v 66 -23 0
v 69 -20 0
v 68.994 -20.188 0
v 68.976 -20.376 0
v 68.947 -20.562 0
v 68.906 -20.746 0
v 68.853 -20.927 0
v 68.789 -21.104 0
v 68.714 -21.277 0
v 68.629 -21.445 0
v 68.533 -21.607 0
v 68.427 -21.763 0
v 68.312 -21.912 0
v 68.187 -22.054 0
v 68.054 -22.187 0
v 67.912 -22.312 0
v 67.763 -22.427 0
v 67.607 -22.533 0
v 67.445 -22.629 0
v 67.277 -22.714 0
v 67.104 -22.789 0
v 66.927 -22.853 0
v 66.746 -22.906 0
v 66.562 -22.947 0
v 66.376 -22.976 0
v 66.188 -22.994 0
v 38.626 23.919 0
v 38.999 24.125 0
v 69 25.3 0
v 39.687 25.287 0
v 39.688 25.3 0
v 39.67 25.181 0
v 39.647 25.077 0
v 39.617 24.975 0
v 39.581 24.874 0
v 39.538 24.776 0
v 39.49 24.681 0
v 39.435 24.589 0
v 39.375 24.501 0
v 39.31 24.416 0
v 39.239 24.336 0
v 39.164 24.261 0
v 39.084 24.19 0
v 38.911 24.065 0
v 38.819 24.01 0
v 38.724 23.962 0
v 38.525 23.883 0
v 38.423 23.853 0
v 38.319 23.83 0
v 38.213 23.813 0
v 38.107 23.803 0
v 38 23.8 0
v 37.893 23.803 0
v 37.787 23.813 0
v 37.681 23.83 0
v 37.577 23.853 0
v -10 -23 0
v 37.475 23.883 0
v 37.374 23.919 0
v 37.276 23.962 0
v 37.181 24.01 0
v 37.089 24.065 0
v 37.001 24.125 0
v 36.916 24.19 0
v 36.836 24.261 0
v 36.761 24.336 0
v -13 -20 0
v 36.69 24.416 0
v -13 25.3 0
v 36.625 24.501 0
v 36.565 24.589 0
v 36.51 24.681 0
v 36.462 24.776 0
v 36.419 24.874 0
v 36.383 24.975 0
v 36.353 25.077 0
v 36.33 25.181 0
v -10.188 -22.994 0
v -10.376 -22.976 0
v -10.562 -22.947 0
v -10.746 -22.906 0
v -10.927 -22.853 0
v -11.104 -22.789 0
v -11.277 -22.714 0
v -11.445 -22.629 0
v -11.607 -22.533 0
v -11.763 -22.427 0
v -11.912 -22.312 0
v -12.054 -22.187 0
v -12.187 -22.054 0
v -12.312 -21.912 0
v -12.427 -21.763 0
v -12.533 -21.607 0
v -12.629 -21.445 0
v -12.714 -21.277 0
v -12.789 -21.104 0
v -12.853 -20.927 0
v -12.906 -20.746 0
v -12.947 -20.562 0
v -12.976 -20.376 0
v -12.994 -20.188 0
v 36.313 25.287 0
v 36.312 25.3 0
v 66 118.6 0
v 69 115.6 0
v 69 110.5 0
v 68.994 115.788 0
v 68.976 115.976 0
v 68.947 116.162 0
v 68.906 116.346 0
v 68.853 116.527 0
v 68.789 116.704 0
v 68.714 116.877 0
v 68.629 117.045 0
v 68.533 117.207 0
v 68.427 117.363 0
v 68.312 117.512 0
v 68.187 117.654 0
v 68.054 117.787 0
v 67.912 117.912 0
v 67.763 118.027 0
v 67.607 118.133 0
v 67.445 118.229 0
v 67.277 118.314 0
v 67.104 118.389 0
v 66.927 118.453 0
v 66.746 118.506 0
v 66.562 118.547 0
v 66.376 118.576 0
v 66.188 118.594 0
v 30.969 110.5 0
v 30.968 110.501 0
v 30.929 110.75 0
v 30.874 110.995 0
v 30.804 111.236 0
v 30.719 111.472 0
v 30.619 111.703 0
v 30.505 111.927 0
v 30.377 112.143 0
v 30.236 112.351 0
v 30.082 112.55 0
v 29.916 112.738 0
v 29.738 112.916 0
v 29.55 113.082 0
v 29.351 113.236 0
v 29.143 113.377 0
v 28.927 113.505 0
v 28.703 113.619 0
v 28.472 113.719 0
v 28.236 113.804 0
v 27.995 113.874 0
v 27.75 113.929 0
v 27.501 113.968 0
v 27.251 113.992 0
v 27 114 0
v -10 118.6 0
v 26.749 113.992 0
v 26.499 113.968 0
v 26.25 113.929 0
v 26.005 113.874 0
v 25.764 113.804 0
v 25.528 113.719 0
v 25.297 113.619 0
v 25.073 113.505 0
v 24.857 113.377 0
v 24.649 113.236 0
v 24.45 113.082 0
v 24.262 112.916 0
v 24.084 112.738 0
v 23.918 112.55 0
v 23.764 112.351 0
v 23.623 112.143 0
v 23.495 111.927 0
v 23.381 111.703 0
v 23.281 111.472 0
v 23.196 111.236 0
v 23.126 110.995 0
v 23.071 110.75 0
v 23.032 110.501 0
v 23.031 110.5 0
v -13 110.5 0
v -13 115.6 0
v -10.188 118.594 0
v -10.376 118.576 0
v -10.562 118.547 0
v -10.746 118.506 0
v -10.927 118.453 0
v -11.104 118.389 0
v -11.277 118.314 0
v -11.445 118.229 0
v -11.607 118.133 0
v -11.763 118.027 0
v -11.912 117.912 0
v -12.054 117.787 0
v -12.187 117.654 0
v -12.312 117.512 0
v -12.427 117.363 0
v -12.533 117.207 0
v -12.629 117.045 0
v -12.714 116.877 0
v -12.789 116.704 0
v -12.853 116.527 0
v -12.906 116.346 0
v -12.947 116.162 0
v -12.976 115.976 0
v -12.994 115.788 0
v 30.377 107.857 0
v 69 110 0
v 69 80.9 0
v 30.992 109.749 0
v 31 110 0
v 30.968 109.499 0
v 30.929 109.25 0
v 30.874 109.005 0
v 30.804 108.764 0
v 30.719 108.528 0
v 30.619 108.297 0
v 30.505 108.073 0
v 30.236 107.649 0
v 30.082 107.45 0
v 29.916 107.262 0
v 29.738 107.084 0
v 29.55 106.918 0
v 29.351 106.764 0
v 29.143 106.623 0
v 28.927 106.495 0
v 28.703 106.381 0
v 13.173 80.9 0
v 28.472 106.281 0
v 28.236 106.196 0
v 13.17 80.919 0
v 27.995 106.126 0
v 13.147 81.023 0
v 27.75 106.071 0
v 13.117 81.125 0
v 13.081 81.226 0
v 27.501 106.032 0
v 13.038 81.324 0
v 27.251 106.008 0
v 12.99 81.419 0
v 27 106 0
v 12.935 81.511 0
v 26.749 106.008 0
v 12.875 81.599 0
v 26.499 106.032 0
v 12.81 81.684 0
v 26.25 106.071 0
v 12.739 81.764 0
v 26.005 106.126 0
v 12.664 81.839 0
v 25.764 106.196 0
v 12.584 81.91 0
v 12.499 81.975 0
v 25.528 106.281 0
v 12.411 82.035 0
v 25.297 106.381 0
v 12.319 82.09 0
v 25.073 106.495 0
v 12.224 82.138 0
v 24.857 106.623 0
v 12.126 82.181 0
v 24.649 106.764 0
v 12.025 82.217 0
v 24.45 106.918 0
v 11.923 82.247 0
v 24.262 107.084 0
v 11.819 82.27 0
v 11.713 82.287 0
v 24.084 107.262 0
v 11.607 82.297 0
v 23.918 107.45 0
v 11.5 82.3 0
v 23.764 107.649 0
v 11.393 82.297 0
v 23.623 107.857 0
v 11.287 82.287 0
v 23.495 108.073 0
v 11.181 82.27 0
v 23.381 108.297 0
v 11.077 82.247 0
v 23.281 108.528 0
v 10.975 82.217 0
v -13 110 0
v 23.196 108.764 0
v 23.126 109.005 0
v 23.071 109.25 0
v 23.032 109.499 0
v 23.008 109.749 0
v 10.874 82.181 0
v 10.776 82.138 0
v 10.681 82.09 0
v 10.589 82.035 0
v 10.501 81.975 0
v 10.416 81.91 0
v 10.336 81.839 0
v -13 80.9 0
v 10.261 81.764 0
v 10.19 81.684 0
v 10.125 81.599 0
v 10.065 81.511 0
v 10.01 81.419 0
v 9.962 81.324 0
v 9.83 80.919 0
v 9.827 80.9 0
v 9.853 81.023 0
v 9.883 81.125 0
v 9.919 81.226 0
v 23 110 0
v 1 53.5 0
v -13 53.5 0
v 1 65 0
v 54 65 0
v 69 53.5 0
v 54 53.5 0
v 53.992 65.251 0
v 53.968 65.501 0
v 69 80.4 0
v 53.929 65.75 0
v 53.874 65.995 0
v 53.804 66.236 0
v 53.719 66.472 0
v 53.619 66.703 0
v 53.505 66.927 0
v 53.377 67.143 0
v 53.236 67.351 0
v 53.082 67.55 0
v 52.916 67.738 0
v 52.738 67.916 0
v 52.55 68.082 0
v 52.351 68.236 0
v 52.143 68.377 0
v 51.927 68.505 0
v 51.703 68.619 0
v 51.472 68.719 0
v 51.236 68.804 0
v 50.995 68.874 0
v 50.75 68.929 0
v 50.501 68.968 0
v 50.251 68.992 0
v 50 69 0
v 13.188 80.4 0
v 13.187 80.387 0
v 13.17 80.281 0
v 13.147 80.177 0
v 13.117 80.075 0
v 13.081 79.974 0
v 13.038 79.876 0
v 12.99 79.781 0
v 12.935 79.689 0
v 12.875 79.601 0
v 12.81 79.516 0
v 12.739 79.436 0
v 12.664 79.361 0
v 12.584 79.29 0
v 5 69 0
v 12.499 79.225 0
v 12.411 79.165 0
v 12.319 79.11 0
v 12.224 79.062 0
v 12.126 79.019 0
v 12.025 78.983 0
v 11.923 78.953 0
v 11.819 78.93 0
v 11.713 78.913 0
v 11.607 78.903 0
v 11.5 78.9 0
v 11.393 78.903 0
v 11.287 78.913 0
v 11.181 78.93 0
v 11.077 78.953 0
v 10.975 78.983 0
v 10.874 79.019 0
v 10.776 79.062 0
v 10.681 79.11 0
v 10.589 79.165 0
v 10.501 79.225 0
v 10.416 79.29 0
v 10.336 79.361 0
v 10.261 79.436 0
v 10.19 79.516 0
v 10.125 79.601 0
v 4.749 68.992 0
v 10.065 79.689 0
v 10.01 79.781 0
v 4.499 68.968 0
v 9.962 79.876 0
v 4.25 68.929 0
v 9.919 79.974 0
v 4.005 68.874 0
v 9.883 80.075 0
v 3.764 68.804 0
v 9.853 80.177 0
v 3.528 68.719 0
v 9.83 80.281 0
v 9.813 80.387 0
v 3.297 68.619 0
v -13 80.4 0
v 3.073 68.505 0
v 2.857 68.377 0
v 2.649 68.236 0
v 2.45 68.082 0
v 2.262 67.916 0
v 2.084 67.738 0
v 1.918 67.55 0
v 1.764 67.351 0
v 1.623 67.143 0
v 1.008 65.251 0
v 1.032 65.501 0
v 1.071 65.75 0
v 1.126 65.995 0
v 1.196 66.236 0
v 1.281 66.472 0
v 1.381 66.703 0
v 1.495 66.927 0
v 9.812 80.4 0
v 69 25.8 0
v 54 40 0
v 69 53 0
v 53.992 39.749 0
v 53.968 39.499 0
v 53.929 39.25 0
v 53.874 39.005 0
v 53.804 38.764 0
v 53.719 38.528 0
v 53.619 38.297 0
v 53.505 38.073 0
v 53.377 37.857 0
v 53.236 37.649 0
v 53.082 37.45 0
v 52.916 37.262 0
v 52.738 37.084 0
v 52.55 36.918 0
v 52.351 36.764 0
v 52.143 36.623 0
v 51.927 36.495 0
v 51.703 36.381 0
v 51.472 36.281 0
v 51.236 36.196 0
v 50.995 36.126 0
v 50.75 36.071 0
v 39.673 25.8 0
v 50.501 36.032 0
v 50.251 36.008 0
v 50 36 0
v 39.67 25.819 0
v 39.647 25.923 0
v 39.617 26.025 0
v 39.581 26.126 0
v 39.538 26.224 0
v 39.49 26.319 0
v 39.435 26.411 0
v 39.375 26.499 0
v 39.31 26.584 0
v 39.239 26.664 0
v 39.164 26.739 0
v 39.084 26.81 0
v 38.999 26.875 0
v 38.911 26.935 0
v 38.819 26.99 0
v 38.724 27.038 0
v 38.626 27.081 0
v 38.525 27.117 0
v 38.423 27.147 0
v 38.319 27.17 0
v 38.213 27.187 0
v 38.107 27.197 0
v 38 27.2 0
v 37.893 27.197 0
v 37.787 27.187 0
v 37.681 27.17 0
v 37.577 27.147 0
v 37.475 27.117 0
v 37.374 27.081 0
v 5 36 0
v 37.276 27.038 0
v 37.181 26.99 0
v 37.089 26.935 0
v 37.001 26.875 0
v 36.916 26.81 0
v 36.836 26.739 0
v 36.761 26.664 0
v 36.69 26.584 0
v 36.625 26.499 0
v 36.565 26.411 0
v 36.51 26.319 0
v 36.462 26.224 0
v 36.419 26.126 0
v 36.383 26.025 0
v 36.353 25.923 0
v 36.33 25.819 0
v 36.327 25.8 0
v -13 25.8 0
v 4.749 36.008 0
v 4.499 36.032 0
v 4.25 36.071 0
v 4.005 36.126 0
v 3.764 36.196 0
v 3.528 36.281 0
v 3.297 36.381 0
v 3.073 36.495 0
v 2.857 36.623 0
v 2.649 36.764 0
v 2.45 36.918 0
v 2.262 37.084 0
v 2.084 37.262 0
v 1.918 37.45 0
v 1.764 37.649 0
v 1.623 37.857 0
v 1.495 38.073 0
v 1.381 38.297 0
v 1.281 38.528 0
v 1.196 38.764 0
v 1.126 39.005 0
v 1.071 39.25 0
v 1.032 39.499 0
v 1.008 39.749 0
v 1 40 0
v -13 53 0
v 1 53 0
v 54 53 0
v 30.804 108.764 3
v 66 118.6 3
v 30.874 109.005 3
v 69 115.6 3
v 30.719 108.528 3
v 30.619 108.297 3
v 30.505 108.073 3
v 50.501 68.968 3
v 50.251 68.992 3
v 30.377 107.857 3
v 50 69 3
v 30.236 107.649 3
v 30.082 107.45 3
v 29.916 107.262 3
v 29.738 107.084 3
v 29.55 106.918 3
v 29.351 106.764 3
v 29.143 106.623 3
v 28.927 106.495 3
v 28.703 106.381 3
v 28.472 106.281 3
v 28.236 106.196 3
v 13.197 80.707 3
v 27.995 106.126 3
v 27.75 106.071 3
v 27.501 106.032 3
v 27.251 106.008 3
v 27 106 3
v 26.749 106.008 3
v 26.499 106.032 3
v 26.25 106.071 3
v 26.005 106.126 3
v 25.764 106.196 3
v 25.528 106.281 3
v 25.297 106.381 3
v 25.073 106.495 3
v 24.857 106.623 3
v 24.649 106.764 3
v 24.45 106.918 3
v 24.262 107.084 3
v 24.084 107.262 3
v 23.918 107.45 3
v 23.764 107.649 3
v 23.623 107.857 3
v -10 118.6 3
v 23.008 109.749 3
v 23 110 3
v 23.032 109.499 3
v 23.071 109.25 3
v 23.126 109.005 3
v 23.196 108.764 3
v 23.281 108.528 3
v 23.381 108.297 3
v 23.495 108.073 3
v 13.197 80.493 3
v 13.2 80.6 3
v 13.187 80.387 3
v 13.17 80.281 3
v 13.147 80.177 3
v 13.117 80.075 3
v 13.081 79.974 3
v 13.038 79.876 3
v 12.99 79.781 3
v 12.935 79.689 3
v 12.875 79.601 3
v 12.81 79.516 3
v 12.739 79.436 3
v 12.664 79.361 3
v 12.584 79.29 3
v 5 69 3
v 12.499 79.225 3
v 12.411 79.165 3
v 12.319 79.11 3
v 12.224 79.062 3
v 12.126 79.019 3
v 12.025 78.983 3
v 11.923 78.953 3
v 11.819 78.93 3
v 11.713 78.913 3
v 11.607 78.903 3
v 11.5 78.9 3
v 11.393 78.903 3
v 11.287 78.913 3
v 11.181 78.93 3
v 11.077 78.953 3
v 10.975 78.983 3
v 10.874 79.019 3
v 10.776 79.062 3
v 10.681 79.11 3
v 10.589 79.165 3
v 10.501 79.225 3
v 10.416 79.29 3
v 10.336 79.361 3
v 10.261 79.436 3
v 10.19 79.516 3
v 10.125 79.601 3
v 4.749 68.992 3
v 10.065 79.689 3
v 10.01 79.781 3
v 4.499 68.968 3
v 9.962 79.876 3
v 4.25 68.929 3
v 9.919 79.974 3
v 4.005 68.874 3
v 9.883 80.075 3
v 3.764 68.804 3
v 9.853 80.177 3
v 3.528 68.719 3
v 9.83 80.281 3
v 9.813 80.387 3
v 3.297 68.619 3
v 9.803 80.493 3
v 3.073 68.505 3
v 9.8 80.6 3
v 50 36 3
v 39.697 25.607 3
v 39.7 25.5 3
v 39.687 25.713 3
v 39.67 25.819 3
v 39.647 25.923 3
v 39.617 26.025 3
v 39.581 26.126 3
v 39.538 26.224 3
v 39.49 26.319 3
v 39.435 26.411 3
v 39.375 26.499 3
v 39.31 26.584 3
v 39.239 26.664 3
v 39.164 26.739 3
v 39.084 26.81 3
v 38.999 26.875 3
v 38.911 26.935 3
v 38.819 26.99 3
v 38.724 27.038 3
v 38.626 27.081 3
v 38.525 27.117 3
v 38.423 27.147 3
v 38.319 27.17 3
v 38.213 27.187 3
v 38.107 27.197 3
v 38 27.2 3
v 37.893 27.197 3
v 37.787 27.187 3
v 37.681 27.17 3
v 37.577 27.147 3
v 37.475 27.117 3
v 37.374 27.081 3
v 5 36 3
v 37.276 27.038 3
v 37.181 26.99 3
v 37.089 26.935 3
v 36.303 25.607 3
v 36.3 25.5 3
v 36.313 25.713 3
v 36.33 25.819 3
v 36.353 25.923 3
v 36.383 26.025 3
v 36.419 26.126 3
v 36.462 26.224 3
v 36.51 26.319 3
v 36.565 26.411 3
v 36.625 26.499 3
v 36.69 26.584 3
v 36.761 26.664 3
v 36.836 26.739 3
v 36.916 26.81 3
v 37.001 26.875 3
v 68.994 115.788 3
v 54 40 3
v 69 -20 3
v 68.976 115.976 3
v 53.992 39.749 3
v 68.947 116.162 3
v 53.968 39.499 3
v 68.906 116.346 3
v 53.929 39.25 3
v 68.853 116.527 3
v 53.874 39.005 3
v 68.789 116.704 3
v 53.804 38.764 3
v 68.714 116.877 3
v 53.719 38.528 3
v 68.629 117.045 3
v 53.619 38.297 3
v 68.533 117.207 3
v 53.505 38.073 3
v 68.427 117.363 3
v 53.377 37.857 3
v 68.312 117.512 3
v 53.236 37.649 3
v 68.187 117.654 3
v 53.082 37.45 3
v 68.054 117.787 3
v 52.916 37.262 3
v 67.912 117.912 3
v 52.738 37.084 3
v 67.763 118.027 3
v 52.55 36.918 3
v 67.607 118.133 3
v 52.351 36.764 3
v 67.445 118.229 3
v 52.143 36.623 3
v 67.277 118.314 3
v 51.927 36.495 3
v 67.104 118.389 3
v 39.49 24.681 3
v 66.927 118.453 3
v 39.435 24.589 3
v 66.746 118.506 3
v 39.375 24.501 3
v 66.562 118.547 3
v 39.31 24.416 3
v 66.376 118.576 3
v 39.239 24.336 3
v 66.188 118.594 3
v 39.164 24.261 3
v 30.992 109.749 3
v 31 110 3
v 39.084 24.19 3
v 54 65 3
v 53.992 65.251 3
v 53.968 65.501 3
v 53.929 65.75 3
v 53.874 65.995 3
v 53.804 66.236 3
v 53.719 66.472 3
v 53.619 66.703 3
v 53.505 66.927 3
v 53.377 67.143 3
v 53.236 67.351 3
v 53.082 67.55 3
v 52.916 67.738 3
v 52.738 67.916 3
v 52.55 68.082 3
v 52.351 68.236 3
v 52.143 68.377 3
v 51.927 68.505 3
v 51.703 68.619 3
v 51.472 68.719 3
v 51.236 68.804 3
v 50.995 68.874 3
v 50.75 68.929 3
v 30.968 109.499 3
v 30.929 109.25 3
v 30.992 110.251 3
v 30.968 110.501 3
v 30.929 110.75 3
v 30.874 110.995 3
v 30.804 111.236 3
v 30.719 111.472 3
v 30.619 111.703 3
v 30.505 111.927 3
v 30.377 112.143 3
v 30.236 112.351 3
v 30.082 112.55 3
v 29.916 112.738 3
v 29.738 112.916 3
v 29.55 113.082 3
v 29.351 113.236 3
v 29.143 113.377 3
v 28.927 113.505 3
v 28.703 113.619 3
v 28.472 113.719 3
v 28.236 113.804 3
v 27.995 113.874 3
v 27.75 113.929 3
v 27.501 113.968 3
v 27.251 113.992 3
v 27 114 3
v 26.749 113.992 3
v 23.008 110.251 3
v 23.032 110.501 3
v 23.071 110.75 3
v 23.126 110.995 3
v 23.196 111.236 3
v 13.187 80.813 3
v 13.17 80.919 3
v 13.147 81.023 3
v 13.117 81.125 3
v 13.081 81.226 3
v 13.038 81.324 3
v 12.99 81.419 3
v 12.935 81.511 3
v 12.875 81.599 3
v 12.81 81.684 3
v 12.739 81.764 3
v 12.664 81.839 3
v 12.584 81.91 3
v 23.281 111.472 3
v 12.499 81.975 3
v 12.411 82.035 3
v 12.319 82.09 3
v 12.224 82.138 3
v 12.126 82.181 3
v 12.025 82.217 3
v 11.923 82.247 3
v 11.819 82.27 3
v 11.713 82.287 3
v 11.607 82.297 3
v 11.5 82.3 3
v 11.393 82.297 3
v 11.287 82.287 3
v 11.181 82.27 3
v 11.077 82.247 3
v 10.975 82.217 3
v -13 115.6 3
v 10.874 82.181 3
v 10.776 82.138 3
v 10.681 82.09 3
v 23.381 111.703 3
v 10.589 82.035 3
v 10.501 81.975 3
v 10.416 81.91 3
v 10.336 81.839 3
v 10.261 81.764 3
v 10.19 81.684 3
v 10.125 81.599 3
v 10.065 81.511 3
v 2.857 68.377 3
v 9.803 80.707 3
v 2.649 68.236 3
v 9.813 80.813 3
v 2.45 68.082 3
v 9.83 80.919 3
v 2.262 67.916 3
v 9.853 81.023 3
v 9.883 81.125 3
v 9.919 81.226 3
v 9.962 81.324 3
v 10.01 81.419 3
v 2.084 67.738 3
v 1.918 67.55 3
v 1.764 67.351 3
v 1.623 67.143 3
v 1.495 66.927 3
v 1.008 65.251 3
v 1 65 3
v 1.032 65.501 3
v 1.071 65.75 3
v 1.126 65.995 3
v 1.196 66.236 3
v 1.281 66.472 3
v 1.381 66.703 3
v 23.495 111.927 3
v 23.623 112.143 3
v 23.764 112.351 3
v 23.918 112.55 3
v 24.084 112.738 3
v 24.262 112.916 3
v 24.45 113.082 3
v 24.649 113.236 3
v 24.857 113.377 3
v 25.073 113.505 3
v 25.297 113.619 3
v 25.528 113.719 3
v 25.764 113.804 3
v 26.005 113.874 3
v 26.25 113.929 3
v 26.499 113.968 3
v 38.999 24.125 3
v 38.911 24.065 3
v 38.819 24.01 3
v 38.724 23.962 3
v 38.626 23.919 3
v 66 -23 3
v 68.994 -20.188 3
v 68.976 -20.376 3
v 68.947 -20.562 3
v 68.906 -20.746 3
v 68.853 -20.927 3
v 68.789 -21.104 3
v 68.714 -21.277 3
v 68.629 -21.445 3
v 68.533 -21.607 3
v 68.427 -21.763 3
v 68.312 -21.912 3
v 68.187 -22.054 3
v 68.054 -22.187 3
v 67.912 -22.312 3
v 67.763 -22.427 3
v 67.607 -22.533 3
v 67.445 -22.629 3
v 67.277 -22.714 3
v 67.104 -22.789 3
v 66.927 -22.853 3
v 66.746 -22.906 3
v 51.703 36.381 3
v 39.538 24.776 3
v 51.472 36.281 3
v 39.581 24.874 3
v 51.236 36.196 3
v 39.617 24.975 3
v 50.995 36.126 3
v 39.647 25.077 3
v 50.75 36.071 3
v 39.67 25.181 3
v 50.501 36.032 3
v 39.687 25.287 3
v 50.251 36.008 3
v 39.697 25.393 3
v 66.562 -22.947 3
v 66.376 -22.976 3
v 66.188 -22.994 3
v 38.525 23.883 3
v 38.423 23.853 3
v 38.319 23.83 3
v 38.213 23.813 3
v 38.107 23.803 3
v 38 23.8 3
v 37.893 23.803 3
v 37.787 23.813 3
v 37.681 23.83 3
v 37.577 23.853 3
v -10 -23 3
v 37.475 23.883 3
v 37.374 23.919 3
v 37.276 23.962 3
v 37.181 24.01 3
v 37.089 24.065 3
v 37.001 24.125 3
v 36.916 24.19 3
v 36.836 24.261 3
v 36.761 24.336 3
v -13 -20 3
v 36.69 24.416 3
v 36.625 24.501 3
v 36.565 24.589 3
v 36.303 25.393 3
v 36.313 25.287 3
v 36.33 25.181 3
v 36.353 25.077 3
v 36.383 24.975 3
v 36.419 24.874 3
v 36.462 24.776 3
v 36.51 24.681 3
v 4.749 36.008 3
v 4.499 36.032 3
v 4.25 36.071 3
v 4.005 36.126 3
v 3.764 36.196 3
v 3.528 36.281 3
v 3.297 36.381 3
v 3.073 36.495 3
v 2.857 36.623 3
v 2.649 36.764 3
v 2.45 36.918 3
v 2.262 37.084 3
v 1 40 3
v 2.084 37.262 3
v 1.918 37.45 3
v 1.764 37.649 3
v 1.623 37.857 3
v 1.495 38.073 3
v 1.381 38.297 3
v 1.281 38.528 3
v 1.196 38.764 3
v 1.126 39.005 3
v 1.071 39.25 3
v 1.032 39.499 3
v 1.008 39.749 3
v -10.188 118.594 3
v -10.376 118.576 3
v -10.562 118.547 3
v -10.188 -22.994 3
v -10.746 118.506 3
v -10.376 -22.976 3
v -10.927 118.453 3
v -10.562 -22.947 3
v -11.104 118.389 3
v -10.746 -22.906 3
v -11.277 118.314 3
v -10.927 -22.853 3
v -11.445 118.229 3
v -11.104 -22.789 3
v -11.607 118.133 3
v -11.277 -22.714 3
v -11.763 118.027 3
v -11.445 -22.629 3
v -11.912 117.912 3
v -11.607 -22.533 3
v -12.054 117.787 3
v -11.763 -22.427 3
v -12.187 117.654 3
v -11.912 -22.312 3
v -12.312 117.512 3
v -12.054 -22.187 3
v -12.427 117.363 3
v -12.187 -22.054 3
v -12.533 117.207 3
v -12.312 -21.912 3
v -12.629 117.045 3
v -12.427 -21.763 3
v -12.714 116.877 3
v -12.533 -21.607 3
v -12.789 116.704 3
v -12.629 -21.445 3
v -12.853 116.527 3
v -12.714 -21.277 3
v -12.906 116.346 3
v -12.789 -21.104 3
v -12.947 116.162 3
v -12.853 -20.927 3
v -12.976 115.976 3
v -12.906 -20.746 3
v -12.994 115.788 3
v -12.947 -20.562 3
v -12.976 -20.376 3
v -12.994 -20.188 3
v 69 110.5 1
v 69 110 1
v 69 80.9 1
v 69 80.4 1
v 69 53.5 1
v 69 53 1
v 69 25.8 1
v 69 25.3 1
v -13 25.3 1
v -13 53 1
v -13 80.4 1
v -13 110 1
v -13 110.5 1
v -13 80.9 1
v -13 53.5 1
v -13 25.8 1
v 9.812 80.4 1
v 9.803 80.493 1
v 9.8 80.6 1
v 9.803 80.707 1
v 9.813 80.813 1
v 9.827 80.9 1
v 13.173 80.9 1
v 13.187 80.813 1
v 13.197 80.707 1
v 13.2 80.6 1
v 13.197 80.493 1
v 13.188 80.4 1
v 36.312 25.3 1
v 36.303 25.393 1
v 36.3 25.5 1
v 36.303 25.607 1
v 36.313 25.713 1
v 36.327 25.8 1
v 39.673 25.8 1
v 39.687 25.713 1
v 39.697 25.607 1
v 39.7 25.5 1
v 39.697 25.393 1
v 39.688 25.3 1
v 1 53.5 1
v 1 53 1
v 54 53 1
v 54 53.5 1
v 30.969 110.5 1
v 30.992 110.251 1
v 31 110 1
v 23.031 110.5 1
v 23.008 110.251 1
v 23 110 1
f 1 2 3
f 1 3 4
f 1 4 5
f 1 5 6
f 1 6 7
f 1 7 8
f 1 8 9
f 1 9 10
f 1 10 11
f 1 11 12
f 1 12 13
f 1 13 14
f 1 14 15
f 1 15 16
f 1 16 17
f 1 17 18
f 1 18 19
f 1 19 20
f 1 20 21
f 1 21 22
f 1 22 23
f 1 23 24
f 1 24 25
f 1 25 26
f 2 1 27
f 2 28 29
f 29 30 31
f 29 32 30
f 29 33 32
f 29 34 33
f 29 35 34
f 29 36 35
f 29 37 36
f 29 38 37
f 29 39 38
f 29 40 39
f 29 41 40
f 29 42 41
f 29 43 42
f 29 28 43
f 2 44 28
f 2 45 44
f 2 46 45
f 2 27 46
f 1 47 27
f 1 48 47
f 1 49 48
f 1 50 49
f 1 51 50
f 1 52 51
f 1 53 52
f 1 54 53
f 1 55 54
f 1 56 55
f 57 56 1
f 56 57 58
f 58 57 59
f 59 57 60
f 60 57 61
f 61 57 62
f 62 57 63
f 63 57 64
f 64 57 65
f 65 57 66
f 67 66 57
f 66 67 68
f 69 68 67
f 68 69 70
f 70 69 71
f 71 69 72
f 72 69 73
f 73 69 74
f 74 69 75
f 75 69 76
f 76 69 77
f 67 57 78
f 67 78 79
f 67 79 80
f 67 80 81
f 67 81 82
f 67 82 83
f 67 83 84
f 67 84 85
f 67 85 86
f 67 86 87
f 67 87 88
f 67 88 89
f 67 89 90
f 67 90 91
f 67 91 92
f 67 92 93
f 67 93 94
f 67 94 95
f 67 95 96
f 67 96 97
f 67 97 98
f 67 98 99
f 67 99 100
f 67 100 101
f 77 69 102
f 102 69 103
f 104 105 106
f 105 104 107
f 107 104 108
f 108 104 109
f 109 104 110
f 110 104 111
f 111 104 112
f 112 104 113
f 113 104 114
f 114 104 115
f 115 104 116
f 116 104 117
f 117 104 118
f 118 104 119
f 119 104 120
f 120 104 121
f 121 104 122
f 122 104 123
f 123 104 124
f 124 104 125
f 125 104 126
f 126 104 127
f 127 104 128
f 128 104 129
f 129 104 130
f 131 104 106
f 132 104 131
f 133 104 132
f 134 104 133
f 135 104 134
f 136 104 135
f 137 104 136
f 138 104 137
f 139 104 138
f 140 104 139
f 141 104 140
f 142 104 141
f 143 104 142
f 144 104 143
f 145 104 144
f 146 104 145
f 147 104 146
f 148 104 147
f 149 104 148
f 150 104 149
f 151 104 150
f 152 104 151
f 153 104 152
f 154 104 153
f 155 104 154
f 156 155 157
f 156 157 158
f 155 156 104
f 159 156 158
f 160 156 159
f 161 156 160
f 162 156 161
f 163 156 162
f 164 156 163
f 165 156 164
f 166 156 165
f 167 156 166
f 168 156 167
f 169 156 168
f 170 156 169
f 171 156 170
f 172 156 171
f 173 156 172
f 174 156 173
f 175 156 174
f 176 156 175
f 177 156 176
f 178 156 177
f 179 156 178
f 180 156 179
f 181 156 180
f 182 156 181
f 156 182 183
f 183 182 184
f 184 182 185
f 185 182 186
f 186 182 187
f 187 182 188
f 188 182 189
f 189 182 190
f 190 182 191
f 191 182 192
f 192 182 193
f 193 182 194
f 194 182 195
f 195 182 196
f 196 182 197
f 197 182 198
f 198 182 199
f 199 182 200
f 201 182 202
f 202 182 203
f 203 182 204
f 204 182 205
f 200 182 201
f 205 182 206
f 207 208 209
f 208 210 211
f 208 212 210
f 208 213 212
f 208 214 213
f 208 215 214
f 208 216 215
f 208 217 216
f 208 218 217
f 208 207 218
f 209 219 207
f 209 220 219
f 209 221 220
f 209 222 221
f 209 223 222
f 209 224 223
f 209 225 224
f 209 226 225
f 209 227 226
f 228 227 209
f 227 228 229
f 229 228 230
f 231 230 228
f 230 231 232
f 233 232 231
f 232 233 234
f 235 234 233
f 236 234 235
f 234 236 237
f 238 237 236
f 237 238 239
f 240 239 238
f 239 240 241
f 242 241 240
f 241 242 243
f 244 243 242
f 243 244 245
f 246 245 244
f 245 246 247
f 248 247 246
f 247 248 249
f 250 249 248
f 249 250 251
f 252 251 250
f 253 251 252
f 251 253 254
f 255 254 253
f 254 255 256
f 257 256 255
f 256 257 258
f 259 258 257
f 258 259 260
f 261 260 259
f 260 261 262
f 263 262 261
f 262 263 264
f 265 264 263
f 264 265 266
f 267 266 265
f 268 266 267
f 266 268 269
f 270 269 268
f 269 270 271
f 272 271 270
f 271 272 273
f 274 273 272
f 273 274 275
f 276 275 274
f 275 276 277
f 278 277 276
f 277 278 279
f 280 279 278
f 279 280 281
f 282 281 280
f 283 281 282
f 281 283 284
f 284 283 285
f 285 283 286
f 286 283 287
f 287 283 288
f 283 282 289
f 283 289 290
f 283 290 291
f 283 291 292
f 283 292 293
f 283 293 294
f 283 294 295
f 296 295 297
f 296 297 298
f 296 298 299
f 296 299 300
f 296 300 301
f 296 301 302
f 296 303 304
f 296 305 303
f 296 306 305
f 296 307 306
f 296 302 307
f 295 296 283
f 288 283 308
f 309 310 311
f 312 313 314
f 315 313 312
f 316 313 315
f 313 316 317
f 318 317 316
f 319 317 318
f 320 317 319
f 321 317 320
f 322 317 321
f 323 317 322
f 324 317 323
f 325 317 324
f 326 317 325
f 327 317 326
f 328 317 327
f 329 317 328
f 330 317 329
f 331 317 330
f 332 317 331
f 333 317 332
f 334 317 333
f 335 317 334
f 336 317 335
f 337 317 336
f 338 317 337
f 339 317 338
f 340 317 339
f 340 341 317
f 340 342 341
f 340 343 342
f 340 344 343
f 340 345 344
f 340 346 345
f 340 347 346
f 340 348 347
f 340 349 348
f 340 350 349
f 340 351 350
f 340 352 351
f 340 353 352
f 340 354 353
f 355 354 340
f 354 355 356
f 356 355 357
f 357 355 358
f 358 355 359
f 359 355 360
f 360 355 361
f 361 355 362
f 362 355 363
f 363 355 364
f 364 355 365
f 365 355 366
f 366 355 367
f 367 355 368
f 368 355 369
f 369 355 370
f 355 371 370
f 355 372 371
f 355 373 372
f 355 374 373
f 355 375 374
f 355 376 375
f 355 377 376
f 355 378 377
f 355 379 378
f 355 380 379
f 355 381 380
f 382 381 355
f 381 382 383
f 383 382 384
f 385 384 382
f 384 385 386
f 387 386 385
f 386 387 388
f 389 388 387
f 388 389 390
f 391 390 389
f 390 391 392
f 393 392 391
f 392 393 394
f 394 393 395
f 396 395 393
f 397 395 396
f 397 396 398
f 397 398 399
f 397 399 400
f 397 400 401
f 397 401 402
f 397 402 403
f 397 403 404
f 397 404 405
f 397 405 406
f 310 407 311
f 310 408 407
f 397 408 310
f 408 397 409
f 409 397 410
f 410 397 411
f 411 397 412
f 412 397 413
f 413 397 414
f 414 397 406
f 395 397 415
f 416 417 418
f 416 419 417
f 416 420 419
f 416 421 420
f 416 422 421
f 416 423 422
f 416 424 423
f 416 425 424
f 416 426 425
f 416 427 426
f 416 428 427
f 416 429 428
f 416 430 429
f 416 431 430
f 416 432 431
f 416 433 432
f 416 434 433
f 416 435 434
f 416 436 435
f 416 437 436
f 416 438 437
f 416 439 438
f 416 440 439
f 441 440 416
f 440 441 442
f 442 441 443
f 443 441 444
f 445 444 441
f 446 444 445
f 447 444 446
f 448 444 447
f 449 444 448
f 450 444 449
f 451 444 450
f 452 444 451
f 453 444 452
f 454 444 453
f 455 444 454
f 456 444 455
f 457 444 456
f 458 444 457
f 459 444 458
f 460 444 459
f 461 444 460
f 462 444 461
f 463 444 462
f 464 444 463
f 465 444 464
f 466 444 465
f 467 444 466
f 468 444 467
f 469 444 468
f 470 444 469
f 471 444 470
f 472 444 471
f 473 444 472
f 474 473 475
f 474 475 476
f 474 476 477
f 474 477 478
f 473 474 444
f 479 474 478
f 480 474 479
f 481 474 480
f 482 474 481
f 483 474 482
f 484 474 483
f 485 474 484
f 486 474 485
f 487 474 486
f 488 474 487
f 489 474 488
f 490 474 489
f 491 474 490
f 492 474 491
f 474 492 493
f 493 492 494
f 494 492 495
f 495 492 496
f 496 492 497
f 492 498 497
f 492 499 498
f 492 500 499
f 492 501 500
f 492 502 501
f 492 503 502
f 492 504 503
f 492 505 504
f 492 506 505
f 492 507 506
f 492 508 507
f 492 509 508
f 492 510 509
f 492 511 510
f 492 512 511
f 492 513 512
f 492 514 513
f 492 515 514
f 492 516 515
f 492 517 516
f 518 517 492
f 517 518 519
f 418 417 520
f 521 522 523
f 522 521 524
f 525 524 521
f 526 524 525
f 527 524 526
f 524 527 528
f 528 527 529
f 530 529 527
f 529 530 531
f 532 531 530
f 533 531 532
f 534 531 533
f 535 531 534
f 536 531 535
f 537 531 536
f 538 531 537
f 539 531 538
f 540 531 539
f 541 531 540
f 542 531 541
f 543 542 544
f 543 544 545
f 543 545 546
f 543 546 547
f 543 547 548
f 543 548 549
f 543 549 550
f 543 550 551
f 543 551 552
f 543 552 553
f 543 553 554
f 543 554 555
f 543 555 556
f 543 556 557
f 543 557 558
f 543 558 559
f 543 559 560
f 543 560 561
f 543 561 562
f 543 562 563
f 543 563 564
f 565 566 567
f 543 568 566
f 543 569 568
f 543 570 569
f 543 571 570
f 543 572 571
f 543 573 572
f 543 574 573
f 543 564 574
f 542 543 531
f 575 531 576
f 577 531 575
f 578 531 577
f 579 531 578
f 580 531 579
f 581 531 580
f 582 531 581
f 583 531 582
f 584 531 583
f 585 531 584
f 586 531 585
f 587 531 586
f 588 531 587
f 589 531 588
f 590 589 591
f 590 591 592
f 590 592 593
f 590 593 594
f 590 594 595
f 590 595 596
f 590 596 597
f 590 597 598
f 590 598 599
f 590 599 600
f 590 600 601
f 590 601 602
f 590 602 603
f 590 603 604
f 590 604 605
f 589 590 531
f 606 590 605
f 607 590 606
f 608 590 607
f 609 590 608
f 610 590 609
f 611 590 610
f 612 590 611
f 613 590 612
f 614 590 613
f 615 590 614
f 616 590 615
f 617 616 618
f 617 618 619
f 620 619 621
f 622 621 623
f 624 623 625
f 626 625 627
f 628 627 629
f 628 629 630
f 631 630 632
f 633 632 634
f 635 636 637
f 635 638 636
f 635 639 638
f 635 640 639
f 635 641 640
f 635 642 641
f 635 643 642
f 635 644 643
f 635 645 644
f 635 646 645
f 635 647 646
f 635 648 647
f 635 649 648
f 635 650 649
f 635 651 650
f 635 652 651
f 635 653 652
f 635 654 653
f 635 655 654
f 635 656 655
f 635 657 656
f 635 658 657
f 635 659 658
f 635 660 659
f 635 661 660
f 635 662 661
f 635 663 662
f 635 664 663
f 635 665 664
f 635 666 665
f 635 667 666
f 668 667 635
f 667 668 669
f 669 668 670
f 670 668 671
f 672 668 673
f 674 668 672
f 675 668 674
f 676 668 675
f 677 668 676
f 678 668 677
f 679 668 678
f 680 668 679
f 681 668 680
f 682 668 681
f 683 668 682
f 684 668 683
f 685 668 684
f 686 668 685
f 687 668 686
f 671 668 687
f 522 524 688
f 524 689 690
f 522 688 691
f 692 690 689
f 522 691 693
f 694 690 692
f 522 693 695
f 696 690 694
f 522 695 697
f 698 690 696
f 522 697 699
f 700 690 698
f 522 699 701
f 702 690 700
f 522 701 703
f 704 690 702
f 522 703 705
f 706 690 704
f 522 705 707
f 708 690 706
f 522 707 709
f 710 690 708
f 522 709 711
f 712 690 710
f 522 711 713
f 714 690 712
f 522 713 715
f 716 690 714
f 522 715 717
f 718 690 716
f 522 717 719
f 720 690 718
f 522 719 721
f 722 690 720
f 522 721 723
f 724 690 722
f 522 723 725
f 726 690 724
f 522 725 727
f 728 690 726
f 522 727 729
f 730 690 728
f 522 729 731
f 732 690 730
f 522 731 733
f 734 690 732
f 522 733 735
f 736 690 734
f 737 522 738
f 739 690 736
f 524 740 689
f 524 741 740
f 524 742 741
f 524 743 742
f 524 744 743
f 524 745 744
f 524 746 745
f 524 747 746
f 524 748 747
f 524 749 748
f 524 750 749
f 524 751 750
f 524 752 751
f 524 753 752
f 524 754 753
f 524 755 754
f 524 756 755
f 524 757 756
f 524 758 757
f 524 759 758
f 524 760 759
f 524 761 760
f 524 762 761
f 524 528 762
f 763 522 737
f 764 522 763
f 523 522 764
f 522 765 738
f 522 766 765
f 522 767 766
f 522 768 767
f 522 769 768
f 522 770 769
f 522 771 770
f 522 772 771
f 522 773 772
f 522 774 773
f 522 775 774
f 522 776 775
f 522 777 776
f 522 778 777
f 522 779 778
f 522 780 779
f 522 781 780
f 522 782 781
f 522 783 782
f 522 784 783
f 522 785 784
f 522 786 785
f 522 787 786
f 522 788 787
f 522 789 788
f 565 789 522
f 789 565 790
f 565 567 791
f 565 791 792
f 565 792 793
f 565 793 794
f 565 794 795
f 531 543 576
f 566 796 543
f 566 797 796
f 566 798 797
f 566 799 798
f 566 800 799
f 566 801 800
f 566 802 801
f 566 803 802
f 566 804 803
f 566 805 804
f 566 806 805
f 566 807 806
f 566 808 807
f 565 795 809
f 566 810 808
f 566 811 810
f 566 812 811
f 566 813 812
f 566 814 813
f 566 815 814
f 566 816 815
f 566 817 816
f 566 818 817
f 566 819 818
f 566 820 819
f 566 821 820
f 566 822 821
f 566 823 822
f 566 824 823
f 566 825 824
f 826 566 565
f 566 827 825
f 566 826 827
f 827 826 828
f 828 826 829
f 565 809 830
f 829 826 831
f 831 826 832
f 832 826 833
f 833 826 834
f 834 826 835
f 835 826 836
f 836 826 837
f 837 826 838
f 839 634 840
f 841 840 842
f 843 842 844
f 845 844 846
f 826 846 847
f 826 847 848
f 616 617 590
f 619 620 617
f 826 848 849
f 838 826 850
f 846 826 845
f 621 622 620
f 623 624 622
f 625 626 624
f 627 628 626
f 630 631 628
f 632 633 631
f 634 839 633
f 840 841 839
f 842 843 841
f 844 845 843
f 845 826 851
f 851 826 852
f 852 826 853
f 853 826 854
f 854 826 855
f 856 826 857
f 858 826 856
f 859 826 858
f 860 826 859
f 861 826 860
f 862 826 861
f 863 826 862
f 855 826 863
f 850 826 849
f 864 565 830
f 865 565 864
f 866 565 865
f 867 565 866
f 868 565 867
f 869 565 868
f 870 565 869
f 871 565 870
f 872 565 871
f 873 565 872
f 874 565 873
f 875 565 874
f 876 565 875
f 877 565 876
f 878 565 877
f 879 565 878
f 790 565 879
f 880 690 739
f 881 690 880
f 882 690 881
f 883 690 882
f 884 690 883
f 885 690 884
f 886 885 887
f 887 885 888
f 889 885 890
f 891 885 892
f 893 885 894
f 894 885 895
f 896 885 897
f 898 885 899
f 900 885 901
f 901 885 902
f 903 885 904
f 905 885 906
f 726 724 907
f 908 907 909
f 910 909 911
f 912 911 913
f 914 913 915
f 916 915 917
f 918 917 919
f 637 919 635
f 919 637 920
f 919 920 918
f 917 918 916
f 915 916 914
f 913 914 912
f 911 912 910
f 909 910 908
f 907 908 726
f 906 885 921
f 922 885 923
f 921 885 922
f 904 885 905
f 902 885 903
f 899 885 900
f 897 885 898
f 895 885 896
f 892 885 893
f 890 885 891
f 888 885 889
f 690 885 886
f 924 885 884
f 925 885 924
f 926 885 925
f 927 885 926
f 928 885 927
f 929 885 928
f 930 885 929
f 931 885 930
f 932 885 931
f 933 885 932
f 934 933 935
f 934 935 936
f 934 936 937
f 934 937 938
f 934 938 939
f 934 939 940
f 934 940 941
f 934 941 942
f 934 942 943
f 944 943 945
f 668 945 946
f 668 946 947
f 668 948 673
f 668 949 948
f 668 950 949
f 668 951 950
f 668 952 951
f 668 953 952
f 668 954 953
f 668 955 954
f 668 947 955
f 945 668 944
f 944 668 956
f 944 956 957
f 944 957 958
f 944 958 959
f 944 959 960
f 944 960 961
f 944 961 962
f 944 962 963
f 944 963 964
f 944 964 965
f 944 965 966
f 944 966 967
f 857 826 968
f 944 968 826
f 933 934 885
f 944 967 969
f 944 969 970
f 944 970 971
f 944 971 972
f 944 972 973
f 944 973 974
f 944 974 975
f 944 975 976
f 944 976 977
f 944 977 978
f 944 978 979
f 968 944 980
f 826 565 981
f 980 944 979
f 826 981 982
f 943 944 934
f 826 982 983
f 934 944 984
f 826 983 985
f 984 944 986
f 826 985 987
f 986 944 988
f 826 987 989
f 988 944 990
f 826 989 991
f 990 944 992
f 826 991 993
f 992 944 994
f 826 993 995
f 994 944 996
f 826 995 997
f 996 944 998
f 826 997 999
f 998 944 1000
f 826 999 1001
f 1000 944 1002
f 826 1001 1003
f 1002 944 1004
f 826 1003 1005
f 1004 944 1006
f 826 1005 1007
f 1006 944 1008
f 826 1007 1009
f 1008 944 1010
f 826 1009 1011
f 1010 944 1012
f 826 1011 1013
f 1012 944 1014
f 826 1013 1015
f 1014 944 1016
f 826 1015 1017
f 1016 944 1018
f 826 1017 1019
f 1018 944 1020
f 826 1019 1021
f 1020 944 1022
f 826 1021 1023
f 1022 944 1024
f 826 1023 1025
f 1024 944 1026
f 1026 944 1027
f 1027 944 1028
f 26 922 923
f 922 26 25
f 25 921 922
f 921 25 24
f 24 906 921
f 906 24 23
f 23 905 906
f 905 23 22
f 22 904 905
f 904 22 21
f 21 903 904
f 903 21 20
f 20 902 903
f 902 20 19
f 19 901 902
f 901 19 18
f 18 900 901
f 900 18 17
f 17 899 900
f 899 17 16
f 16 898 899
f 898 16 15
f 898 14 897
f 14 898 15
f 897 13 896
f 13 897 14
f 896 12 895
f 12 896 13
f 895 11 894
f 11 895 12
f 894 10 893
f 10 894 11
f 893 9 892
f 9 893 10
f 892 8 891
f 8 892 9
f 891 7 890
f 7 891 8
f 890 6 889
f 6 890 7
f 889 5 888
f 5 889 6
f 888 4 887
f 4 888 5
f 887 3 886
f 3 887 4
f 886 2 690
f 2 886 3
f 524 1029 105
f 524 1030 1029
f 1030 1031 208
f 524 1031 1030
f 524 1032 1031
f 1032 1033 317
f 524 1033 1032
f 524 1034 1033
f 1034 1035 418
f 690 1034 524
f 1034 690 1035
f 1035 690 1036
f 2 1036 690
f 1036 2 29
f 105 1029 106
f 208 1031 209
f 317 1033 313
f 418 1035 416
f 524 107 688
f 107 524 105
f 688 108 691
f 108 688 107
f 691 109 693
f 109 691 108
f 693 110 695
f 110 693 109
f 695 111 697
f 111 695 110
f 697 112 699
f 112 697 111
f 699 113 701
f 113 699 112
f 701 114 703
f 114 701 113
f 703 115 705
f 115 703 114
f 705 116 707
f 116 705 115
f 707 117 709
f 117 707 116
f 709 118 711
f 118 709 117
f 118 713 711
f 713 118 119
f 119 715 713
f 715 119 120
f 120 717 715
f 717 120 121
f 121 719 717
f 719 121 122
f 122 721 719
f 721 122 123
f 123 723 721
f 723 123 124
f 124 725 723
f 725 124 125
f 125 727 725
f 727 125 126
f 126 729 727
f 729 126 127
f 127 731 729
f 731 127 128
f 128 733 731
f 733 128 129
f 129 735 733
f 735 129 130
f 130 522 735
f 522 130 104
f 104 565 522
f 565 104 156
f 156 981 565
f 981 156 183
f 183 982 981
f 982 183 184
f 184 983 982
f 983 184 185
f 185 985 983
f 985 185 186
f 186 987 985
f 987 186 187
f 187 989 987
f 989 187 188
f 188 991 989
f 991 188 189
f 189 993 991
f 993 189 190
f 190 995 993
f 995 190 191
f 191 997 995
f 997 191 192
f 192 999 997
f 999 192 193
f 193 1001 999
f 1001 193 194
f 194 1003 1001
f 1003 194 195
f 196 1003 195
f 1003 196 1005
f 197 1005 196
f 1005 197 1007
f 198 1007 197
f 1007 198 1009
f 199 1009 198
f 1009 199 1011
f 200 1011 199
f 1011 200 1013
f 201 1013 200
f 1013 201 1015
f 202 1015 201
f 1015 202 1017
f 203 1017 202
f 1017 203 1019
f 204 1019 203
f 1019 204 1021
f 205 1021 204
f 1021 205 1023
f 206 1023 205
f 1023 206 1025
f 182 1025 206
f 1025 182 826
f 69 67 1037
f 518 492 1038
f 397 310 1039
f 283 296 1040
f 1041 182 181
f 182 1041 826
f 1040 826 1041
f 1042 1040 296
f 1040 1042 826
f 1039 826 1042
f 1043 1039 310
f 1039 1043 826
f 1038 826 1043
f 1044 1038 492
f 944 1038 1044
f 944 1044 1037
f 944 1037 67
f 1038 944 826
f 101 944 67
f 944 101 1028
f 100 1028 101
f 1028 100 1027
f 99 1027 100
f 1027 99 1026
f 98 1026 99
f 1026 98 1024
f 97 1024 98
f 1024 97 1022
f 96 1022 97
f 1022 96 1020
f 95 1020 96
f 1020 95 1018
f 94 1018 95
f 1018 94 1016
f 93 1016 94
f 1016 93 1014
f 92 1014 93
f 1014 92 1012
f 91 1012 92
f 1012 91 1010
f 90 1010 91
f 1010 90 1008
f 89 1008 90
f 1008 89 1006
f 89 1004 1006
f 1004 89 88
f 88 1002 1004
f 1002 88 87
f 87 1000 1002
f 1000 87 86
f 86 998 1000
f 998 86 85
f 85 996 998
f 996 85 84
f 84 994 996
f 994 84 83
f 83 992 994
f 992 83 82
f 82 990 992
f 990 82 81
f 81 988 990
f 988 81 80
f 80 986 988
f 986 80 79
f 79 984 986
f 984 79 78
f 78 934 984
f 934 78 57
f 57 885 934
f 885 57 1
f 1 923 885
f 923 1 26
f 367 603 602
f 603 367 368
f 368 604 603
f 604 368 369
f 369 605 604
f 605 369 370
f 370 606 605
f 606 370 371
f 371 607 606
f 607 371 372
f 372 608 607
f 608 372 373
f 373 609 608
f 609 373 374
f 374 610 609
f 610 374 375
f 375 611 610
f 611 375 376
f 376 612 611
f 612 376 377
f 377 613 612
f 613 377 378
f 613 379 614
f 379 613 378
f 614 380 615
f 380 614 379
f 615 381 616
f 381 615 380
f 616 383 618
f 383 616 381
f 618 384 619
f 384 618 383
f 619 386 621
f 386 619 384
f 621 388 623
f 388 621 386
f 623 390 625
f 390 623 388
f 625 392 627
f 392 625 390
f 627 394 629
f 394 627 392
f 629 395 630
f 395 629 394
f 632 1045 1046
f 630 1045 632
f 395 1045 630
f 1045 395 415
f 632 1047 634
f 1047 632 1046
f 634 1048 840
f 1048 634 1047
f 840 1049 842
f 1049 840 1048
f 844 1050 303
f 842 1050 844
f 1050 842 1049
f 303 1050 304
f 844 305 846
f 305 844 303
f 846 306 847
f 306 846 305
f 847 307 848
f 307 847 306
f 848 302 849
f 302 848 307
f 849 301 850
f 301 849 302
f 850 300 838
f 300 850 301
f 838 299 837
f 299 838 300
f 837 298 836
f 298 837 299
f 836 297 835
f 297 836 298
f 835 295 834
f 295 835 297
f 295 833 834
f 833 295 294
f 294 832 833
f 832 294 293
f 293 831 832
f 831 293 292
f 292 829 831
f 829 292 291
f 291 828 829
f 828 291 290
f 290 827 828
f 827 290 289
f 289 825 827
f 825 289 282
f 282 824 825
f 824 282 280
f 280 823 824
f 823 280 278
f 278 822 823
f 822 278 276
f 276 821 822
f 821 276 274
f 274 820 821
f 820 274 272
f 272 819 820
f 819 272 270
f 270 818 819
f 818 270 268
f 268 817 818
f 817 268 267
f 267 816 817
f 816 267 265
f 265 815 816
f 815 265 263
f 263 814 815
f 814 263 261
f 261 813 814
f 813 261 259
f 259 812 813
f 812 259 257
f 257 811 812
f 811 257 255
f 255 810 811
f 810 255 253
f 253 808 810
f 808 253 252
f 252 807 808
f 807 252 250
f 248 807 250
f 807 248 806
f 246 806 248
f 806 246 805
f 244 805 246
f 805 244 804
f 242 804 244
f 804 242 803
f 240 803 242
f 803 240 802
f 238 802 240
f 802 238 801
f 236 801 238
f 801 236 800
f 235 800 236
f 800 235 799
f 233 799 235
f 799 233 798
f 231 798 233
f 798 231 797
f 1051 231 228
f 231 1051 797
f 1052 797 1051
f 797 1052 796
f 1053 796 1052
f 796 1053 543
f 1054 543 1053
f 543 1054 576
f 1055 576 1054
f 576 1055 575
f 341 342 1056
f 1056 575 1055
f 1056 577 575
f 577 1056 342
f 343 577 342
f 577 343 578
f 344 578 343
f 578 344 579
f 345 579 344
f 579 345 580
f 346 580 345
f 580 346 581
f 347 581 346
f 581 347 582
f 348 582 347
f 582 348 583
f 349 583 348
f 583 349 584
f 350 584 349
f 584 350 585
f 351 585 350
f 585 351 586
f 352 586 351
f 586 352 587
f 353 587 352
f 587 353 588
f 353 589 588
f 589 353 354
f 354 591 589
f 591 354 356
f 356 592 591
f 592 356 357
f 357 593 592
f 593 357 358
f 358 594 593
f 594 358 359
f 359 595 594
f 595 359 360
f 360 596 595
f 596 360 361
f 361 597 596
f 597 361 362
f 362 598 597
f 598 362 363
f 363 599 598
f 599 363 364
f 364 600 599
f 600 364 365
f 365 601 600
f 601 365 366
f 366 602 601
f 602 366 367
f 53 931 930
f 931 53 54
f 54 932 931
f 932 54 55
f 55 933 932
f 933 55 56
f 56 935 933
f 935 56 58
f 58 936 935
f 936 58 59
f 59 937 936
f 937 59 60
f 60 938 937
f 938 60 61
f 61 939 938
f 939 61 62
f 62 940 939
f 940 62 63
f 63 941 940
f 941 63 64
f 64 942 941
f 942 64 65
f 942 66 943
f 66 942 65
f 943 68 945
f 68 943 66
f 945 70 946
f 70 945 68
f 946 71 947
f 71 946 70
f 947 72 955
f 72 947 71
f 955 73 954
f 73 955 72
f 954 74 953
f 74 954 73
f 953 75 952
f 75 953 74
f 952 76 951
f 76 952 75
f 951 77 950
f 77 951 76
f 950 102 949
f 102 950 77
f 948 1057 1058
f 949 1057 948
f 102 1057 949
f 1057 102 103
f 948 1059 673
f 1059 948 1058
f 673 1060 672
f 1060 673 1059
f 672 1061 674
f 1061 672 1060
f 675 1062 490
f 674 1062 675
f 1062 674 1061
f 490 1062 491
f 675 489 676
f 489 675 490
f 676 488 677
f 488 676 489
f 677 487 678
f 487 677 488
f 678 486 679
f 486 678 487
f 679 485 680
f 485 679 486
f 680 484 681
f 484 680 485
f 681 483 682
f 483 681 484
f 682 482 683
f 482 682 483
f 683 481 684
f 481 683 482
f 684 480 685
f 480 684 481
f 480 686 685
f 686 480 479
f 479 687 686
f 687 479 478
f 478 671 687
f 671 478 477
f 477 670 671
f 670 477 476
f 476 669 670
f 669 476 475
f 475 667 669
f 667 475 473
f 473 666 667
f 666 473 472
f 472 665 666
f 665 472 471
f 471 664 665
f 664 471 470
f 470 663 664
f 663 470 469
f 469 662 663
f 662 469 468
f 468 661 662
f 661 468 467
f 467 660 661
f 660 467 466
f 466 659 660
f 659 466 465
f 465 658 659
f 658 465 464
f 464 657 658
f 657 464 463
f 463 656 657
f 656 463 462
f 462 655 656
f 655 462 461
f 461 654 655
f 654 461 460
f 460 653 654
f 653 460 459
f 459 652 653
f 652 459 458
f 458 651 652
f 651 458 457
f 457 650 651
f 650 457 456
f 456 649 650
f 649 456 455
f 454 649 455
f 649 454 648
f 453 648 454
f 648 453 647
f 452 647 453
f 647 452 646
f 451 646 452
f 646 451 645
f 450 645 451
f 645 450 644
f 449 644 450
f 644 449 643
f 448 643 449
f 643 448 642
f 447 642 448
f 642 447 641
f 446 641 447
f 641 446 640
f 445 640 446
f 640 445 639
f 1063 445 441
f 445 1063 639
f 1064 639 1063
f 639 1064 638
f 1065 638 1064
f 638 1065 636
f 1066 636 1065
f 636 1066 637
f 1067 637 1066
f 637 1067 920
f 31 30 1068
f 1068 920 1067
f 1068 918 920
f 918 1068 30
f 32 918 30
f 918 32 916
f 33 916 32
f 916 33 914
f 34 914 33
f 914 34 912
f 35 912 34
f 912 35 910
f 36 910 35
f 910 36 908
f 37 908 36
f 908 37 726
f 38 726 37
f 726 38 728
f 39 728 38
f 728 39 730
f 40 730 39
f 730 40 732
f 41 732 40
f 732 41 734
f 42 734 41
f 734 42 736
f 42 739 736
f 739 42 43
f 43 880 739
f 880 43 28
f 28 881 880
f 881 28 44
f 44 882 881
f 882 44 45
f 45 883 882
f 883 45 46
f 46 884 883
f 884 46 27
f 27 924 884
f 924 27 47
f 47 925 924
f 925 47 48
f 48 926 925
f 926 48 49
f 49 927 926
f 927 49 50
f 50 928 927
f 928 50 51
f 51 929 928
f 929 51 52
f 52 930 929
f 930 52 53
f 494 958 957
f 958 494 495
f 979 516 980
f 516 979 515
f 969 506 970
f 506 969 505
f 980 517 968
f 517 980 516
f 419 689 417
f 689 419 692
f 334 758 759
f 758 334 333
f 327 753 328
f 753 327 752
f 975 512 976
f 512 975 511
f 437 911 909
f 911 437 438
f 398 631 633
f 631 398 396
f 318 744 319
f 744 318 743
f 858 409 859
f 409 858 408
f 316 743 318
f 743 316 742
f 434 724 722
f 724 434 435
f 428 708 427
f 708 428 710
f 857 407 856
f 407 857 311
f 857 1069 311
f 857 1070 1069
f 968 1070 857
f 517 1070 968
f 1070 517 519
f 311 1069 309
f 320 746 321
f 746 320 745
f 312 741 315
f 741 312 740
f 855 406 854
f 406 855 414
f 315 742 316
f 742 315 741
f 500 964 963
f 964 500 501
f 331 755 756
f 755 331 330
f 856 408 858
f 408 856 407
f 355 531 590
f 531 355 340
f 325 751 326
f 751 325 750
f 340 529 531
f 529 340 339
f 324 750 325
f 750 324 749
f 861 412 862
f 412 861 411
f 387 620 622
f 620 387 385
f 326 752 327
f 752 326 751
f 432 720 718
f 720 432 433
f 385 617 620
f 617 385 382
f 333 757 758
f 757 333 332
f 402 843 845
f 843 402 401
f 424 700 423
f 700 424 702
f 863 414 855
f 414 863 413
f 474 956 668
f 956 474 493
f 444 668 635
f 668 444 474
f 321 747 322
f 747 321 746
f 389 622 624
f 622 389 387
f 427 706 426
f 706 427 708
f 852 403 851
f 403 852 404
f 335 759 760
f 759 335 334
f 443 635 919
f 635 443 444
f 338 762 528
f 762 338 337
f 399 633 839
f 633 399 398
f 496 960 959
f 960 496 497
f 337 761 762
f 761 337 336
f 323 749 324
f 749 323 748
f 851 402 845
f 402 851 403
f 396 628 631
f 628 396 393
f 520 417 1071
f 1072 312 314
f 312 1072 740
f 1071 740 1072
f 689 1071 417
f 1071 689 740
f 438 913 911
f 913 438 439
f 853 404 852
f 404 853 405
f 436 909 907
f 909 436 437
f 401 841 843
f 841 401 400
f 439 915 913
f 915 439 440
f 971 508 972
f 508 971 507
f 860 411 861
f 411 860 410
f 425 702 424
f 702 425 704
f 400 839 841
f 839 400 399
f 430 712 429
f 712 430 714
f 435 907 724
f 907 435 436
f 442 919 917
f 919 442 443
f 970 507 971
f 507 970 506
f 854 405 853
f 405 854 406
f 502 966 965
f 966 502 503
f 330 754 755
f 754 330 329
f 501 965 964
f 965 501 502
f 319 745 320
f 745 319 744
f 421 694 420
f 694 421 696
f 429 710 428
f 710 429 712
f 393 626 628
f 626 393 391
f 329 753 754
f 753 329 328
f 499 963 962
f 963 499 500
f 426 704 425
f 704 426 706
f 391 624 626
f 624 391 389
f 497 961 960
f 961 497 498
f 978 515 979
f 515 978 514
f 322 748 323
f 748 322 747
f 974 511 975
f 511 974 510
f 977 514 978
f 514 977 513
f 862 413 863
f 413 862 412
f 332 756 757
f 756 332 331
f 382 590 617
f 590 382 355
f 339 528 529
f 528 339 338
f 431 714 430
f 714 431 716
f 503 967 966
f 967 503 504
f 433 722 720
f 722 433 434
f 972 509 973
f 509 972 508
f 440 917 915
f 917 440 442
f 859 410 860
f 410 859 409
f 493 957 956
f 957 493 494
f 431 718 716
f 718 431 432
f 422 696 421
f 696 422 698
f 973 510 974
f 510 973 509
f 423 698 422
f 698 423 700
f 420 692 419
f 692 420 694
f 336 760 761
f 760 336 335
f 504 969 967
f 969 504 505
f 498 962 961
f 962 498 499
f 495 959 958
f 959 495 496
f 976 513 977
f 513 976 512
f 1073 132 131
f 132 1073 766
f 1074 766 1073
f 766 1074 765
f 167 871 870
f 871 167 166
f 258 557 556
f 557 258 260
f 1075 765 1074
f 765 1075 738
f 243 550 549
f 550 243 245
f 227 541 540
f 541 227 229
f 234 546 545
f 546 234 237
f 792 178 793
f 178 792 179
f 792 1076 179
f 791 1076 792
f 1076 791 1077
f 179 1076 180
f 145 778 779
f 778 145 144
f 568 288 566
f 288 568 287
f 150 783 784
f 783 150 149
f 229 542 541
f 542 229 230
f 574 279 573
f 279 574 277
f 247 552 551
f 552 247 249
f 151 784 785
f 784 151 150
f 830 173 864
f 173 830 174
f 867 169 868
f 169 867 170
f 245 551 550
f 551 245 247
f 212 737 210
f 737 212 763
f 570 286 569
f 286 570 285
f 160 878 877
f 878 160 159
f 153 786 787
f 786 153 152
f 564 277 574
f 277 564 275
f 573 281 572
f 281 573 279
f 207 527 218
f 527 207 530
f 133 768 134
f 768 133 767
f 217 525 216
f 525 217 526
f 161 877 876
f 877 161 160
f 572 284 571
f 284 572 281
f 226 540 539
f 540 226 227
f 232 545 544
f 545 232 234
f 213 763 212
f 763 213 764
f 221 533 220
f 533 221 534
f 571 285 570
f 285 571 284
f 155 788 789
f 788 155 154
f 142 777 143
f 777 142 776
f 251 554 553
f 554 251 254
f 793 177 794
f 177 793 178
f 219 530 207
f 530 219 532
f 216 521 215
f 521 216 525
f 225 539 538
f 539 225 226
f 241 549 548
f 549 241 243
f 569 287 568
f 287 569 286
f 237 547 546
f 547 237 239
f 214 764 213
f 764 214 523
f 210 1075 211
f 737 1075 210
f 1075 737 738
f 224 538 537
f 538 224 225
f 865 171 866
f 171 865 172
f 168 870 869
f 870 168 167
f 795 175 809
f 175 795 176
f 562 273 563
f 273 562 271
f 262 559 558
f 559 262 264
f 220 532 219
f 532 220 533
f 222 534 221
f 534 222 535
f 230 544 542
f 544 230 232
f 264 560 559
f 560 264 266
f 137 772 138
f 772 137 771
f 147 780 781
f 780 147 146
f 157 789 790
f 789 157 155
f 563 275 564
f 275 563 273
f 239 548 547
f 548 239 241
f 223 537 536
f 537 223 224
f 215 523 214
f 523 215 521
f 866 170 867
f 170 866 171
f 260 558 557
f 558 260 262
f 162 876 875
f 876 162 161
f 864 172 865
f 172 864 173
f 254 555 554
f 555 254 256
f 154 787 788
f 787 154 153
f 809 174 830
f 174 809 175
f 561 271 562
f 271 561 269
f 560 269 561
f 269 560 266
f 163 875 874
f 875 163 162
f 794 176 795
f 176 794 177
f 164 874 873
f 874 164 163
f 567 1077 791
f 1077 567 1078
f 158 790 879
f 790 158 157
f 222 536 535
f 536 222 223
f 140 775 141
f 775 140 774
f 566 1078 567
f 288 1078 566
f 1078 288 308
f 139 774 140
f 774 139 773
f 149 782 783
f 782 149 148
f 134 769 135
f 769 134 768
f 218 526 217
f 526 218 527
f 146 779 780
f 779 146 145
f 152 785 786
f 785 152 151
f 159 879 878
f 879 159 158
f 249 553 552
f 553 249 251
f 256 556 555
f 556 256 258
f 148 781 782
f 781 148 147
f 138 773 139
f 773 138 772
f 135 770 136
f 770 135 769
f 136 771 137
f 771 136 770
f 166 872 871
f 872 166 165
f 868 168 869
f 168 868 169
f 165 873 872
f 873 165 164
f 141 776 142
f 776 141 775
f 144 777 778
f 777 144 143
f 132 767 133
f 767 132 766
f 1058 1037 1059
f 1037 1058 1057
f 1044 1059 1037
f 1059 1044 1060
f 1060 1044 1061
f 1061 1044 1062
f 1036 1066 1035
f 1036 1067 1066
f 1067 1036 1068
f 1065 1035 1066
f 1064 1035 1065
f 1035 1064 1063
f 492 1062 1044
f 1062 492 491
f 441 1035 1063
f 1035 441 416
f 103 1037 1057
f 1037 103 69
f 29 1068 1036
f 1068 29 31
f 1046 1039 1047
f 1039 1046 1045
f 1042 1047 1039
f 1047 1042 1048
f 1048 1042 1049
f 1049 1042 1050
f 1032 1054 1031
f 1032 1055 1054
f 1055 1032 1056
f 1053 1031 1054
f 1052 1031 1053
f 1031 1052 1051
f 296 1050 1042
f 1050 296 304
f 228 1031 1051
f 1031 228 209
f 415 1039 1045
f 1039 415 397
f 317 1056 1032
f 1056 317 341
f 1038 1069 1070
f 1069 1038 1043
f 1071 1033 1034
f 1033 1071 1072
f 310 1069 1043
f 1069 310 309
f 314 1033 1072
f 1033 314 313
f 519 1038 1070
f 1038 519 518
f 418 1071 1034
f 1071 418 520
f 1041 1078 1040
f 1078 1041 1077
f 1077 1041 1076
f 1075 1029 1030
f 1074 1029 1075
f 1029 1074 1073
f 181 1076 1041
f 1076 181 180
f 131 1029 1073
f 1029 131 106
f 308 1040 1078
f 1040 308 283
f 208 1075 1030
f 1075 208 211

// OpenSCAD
difference(){
    linear_extrude(3) difference(){
        // square([56,85.6]);
        translate([-10,-20,0]) hull(){
            circle(3,$fn=100);
            translate([76,0,0]) circle(3,$fn=100);
            translate([0,135.6,0]) circle(3,$fn=100);
            translate([76,135.6,0]) circle(3,$fn=100);
        }
        // holes
        translate([55-17,25.5,0]) circle(1.7,$fn=100);
        translate([11.5,80.6,0]) circle(1.7,$fn=100);
    }
    // cooling hole
    linear_extrude(5) hull(){
        translate([5,65,0]) circle(4,$fn=100);
        translate([50,65,0]) circle(4,$fn=100);
        translate([5,40,0]) circle(4,$fn=100);
        translate([50,40,0]) circle(4,$fn=100);
    }
    // hangerhole
    linear_extrude(5) translate([27,110,0]) circle(4,$fn=100);
    // slits
    translate([-15,25.3,0]) linear_extrude(1) square([90,0.5]);
    translate([-15,80.4,0]) linear_extrude(1) square([90,0.5]);
    translate([-15,53,0]) linear_extrude(1) square([90,0.5]);
    translate([-15,110,0]) linear_extrude(1) square([90,0.5]);
}
